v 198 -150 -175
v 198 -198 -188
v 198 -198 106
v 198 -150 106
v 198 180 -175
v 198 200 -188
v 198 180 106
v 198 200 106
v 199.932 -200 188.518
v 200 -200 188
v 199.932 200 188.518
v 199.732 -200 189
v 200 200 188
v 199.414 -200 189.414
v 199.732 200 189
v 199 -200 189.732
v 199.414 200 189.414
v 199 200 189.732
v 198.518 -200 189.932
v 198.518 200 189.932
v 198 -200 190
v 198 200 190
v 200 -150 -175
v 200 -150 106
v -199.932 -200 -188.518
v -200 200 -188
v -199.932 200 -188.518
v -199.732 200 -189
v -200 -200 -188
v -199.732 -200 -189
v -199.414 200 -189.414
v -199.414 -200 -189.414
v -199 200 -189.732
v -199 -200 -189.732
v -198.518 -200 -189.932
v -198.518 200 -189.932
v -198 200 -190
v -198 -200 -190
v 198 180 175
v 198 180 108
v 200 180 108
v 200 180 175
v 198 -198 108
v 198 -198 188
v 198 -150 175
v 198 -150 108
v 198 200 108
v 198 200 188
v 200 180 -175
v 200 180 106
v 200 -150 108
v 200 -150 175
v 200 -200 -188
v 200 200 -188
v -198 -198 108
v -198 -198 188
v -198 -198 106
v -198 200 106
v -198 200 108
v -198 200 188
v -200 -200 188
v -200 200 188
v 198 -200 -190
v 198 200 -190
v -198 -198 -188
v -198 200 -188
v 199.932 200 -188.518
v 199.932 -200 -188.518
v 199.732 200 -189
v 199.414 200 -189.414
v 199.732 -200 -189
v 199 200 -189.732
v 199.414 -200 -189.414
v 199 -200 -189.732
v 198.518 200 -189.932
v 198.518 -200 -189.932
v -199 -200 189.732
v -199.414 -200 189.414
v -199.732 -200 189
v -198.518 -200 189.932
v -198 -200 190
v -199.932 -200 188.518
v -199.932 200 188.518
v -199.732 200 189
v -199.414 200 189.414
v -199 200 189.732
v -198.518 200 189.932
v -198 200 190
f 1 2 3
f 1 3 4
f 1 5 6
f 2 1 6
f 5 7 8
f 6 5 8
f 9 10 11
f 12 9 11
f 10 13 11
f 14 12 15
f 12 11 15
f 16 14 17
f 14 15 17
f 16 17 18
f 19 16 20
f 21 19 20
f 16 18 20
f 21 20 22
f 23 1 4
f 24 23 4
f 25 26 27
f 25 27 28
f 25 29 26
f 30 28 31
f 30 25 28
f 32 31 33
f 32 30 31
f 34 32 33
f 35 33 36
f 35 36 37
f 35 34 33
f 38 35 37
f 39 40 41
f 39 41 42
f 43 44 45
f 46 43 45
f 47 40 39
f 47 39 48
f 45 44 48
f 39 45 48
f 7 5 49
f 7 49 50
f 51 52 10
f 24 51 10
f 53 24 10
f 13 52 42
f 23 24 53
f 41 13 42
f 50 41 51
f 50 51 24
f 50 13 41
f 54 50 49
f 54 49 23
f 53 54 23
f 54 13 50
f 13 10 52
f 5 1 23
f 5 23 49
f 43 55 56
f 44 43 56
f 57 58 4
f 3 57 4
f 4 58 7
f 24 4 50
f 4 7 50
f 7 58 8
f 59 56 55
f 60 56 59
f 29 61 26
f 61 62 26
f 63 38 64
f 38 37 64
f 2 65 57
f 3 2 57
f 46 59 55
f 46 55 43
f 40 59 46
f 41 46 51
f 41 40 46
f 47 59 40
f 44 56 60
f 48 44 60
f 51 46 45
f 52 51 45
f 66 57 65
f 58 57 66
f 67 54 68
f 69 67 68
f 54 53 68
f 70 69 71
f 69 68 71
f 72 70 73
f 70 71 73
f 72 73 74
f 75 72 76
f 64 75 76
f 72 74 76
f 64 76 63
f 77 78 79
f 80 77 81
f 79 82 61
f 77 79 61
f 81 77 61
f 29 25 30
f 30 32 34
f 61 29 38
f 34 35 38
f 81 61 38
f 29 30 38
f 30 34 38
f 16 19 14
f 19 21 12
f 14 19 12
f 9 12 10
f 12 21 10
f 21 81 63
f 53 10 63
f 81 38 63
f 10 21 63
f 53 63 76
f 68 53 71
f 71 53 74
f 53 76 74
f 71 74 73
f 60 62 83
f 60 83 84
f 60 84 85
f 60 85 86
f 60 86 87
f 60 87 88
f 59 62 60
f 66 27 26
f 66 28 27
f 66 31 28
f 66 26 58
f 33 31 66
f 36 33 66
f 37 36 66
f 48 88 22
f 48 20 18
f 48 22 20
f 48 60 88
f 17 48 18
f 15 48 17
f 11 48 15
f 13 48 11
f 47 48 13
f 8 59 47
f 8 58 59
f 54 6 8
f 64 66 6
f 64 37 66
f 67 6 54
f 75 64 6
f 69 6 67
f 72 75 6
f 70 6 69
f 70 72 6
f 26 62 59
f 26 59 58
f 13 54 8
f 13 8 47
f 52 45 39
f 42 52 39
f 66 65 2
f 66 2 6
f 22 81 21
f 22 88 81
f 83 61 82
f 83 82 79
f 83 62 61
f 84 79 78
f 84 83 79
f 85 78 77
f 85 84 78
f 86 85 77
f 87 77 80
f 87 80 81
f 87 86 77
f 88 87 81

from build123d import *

# Parameters (mm, degrees)
SKETCH1_W           = 400
SKETCH1_H           = 380
BOSS_EXTRUDE1_DEPTH = 200
FILLET1_R           = 2
SHELL1_START        = -198
SHELL1_OUTLINE_W    = 398
SHELL1_OUTLINE_H    = 376
SHELL1_DEPTH        = 396
SKETCH2_W           = 350
SKETCH2_H           = 330
CUT_EXTRUDE1_DEPTH  = 485.256130576
BOSS_EXTRUDE2_REACH = 487.901
SKETCH3_W           = 400
SKETCH3_H           = 2


# Read off the part's stored shape, not the designer's step: Shell1
with BuildPart() as part:
    # Sketch1 → Boss-Extrude1 (new, symmetric)
    with BuildSketch(Plane(origin=(0, 0, 0), x_dir=(1, 0, 0), z_dir=(0, 1, 0))):
        Rectangle(SKETCH1_W, SKETCH1_H)
    extrude(amount=BOSS_EXTRUDE1_DEPTH, both=True)

    # Fillet1
    fillet1_edges = [part.edges().sort_by_distance(p)[0] for p in [
        (200, 0, 190),
        (-200, 0, 190),
        (-200, 0, -190),
        (200, 0, -190),
    ]]
    fillet(fillet1_edges, radius=FILLET1_R)

    # Shell1 outline → Shell1 (cut)
    with BuildSketch(Plane.YZ.offset(SHELL1_START)):
        with Locations((1, 0)):
            Rectangle(SHELL1_OUTLINE_W, SHELL1_OUTLINE_H)
    extrude(amount=SHELL1_DEPTH, mode=Mode.SUBTRACT)

    # Sketch2 → Cut-Extrude1 (cut, through all)
    with BuildSketch(Plane.ZY.offset(-198)):
        with Locations((0, 15)):
            Rectangle(SKETCH2_W, SKETCH2_H)
    extrude(amount=-CUT_EXTRUDE1_DEPTH, mode=Mode.SUBTRACT)

    # Sketch3 → Boss-Extrude2 (add, up to next)
    with BuildSketch(Plane(origin=(0, 200, 0), x_dir=(1, 0, 0), z_dir=(0, 1, 0)), mode=Mode.PRIVATE) as boss_extrude2_sk1:
        with Locations((0, -107)):
            Rectangle(SKETCH3_W, SKETCH3_H)
    boss_extrude2_tool1 = extrude(boss_extrude2_sk1.sketch, amount=-BOSS_EXTRUDE2_REACH, mode=Mode.PRIVATE) - part.part
    add(boss_extrude2_tool1.solids().sort_by_distance((0, 200, 107))[0])


solid = part.part
